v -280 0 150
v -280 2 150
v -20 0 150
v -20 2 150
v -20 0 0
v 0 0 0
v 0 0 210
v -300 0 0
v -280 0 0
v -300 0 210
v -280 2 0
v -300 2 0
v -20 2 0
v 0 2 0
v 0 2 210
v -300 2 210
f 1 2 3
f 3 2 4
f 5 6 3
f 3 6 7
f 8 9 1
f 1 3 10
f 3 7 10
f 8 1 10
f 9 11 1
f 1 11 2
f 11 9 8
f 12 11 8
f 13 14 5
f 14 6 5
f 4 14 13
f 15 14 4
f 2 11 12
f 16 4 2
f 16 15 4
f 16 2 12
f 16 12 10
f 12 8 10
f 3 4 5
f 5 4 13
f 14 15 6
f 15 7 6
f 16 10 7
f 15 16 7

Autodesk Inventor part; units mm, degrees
ref_plane "YZ Plane" through (0, 0, 0) normal (1, 0, 0) x (0, 1, 0)
ref_plane "XZ Plane" through (0, 0, 0) normal (0, 1, 0) x (-1, 0, 0)
ref_plane "XY Plane" through (0, 0, 0) normal (0, 0, 1) x (1, 0, 0)
sketch "草圖1" plane through (0, 0, 0) normal (0, 1, 0) x (-1, 0, 0)
  point P0 (0, 0)
sketch "草圖2" plane through (0, 0, 0) normal (0, 1, 0) x (-1, 0, 0)
  line L0 (0, 0) -> (300, 0)
  line L1 (300, 0) -> (300, 210)
  line L2 (300, 210) -> (0, 210)
  line L3 (0, 210) -> (0, 0)
  dimension "d0" = 210
  dimension "d1" = 300
extrude "擠出1" add sketch "草圖2" along normal blind 2
sketch "草圖3" plane through (0, 2, 0) normal (0, 1, 0) x (1, 0, 0)
  line L0 (-280, -150) -> (-20, -150)
  line L1 (-20, -150) -> (-20, 0)
  line L2 (-20, 0) -> (-280, 0)
  line L3 (-280, 0) -> (-280, -150)
  line L4 (0, 0) -> (-300, 0) projected
  line L5 (-300, 0) -> (-300, -210) projected
  dimension "d4" = 260
  dimension "d5" = 150
  dimension "d6" = 20
extrude "擠出2" cut sketch "草圖3" against normal up to surface (2 mm away)
equation "\"d0\" = W_"
equation "\"d1\" = L_"
equation "\"d2\" = h_"
equation "\"d4\" = l_"
equation "\"d5\" = w_"
equation "\"d6\" = -0.5 * l_ + 0.5 * L_"
equation "\"d7\" = h_"
equation "\"W_\" = 210"
equation "\"L_\" = 300"
equation "\"h_\" = 2"
equation "\"w_\" = 150"
equation "\"l_\" = 260"
